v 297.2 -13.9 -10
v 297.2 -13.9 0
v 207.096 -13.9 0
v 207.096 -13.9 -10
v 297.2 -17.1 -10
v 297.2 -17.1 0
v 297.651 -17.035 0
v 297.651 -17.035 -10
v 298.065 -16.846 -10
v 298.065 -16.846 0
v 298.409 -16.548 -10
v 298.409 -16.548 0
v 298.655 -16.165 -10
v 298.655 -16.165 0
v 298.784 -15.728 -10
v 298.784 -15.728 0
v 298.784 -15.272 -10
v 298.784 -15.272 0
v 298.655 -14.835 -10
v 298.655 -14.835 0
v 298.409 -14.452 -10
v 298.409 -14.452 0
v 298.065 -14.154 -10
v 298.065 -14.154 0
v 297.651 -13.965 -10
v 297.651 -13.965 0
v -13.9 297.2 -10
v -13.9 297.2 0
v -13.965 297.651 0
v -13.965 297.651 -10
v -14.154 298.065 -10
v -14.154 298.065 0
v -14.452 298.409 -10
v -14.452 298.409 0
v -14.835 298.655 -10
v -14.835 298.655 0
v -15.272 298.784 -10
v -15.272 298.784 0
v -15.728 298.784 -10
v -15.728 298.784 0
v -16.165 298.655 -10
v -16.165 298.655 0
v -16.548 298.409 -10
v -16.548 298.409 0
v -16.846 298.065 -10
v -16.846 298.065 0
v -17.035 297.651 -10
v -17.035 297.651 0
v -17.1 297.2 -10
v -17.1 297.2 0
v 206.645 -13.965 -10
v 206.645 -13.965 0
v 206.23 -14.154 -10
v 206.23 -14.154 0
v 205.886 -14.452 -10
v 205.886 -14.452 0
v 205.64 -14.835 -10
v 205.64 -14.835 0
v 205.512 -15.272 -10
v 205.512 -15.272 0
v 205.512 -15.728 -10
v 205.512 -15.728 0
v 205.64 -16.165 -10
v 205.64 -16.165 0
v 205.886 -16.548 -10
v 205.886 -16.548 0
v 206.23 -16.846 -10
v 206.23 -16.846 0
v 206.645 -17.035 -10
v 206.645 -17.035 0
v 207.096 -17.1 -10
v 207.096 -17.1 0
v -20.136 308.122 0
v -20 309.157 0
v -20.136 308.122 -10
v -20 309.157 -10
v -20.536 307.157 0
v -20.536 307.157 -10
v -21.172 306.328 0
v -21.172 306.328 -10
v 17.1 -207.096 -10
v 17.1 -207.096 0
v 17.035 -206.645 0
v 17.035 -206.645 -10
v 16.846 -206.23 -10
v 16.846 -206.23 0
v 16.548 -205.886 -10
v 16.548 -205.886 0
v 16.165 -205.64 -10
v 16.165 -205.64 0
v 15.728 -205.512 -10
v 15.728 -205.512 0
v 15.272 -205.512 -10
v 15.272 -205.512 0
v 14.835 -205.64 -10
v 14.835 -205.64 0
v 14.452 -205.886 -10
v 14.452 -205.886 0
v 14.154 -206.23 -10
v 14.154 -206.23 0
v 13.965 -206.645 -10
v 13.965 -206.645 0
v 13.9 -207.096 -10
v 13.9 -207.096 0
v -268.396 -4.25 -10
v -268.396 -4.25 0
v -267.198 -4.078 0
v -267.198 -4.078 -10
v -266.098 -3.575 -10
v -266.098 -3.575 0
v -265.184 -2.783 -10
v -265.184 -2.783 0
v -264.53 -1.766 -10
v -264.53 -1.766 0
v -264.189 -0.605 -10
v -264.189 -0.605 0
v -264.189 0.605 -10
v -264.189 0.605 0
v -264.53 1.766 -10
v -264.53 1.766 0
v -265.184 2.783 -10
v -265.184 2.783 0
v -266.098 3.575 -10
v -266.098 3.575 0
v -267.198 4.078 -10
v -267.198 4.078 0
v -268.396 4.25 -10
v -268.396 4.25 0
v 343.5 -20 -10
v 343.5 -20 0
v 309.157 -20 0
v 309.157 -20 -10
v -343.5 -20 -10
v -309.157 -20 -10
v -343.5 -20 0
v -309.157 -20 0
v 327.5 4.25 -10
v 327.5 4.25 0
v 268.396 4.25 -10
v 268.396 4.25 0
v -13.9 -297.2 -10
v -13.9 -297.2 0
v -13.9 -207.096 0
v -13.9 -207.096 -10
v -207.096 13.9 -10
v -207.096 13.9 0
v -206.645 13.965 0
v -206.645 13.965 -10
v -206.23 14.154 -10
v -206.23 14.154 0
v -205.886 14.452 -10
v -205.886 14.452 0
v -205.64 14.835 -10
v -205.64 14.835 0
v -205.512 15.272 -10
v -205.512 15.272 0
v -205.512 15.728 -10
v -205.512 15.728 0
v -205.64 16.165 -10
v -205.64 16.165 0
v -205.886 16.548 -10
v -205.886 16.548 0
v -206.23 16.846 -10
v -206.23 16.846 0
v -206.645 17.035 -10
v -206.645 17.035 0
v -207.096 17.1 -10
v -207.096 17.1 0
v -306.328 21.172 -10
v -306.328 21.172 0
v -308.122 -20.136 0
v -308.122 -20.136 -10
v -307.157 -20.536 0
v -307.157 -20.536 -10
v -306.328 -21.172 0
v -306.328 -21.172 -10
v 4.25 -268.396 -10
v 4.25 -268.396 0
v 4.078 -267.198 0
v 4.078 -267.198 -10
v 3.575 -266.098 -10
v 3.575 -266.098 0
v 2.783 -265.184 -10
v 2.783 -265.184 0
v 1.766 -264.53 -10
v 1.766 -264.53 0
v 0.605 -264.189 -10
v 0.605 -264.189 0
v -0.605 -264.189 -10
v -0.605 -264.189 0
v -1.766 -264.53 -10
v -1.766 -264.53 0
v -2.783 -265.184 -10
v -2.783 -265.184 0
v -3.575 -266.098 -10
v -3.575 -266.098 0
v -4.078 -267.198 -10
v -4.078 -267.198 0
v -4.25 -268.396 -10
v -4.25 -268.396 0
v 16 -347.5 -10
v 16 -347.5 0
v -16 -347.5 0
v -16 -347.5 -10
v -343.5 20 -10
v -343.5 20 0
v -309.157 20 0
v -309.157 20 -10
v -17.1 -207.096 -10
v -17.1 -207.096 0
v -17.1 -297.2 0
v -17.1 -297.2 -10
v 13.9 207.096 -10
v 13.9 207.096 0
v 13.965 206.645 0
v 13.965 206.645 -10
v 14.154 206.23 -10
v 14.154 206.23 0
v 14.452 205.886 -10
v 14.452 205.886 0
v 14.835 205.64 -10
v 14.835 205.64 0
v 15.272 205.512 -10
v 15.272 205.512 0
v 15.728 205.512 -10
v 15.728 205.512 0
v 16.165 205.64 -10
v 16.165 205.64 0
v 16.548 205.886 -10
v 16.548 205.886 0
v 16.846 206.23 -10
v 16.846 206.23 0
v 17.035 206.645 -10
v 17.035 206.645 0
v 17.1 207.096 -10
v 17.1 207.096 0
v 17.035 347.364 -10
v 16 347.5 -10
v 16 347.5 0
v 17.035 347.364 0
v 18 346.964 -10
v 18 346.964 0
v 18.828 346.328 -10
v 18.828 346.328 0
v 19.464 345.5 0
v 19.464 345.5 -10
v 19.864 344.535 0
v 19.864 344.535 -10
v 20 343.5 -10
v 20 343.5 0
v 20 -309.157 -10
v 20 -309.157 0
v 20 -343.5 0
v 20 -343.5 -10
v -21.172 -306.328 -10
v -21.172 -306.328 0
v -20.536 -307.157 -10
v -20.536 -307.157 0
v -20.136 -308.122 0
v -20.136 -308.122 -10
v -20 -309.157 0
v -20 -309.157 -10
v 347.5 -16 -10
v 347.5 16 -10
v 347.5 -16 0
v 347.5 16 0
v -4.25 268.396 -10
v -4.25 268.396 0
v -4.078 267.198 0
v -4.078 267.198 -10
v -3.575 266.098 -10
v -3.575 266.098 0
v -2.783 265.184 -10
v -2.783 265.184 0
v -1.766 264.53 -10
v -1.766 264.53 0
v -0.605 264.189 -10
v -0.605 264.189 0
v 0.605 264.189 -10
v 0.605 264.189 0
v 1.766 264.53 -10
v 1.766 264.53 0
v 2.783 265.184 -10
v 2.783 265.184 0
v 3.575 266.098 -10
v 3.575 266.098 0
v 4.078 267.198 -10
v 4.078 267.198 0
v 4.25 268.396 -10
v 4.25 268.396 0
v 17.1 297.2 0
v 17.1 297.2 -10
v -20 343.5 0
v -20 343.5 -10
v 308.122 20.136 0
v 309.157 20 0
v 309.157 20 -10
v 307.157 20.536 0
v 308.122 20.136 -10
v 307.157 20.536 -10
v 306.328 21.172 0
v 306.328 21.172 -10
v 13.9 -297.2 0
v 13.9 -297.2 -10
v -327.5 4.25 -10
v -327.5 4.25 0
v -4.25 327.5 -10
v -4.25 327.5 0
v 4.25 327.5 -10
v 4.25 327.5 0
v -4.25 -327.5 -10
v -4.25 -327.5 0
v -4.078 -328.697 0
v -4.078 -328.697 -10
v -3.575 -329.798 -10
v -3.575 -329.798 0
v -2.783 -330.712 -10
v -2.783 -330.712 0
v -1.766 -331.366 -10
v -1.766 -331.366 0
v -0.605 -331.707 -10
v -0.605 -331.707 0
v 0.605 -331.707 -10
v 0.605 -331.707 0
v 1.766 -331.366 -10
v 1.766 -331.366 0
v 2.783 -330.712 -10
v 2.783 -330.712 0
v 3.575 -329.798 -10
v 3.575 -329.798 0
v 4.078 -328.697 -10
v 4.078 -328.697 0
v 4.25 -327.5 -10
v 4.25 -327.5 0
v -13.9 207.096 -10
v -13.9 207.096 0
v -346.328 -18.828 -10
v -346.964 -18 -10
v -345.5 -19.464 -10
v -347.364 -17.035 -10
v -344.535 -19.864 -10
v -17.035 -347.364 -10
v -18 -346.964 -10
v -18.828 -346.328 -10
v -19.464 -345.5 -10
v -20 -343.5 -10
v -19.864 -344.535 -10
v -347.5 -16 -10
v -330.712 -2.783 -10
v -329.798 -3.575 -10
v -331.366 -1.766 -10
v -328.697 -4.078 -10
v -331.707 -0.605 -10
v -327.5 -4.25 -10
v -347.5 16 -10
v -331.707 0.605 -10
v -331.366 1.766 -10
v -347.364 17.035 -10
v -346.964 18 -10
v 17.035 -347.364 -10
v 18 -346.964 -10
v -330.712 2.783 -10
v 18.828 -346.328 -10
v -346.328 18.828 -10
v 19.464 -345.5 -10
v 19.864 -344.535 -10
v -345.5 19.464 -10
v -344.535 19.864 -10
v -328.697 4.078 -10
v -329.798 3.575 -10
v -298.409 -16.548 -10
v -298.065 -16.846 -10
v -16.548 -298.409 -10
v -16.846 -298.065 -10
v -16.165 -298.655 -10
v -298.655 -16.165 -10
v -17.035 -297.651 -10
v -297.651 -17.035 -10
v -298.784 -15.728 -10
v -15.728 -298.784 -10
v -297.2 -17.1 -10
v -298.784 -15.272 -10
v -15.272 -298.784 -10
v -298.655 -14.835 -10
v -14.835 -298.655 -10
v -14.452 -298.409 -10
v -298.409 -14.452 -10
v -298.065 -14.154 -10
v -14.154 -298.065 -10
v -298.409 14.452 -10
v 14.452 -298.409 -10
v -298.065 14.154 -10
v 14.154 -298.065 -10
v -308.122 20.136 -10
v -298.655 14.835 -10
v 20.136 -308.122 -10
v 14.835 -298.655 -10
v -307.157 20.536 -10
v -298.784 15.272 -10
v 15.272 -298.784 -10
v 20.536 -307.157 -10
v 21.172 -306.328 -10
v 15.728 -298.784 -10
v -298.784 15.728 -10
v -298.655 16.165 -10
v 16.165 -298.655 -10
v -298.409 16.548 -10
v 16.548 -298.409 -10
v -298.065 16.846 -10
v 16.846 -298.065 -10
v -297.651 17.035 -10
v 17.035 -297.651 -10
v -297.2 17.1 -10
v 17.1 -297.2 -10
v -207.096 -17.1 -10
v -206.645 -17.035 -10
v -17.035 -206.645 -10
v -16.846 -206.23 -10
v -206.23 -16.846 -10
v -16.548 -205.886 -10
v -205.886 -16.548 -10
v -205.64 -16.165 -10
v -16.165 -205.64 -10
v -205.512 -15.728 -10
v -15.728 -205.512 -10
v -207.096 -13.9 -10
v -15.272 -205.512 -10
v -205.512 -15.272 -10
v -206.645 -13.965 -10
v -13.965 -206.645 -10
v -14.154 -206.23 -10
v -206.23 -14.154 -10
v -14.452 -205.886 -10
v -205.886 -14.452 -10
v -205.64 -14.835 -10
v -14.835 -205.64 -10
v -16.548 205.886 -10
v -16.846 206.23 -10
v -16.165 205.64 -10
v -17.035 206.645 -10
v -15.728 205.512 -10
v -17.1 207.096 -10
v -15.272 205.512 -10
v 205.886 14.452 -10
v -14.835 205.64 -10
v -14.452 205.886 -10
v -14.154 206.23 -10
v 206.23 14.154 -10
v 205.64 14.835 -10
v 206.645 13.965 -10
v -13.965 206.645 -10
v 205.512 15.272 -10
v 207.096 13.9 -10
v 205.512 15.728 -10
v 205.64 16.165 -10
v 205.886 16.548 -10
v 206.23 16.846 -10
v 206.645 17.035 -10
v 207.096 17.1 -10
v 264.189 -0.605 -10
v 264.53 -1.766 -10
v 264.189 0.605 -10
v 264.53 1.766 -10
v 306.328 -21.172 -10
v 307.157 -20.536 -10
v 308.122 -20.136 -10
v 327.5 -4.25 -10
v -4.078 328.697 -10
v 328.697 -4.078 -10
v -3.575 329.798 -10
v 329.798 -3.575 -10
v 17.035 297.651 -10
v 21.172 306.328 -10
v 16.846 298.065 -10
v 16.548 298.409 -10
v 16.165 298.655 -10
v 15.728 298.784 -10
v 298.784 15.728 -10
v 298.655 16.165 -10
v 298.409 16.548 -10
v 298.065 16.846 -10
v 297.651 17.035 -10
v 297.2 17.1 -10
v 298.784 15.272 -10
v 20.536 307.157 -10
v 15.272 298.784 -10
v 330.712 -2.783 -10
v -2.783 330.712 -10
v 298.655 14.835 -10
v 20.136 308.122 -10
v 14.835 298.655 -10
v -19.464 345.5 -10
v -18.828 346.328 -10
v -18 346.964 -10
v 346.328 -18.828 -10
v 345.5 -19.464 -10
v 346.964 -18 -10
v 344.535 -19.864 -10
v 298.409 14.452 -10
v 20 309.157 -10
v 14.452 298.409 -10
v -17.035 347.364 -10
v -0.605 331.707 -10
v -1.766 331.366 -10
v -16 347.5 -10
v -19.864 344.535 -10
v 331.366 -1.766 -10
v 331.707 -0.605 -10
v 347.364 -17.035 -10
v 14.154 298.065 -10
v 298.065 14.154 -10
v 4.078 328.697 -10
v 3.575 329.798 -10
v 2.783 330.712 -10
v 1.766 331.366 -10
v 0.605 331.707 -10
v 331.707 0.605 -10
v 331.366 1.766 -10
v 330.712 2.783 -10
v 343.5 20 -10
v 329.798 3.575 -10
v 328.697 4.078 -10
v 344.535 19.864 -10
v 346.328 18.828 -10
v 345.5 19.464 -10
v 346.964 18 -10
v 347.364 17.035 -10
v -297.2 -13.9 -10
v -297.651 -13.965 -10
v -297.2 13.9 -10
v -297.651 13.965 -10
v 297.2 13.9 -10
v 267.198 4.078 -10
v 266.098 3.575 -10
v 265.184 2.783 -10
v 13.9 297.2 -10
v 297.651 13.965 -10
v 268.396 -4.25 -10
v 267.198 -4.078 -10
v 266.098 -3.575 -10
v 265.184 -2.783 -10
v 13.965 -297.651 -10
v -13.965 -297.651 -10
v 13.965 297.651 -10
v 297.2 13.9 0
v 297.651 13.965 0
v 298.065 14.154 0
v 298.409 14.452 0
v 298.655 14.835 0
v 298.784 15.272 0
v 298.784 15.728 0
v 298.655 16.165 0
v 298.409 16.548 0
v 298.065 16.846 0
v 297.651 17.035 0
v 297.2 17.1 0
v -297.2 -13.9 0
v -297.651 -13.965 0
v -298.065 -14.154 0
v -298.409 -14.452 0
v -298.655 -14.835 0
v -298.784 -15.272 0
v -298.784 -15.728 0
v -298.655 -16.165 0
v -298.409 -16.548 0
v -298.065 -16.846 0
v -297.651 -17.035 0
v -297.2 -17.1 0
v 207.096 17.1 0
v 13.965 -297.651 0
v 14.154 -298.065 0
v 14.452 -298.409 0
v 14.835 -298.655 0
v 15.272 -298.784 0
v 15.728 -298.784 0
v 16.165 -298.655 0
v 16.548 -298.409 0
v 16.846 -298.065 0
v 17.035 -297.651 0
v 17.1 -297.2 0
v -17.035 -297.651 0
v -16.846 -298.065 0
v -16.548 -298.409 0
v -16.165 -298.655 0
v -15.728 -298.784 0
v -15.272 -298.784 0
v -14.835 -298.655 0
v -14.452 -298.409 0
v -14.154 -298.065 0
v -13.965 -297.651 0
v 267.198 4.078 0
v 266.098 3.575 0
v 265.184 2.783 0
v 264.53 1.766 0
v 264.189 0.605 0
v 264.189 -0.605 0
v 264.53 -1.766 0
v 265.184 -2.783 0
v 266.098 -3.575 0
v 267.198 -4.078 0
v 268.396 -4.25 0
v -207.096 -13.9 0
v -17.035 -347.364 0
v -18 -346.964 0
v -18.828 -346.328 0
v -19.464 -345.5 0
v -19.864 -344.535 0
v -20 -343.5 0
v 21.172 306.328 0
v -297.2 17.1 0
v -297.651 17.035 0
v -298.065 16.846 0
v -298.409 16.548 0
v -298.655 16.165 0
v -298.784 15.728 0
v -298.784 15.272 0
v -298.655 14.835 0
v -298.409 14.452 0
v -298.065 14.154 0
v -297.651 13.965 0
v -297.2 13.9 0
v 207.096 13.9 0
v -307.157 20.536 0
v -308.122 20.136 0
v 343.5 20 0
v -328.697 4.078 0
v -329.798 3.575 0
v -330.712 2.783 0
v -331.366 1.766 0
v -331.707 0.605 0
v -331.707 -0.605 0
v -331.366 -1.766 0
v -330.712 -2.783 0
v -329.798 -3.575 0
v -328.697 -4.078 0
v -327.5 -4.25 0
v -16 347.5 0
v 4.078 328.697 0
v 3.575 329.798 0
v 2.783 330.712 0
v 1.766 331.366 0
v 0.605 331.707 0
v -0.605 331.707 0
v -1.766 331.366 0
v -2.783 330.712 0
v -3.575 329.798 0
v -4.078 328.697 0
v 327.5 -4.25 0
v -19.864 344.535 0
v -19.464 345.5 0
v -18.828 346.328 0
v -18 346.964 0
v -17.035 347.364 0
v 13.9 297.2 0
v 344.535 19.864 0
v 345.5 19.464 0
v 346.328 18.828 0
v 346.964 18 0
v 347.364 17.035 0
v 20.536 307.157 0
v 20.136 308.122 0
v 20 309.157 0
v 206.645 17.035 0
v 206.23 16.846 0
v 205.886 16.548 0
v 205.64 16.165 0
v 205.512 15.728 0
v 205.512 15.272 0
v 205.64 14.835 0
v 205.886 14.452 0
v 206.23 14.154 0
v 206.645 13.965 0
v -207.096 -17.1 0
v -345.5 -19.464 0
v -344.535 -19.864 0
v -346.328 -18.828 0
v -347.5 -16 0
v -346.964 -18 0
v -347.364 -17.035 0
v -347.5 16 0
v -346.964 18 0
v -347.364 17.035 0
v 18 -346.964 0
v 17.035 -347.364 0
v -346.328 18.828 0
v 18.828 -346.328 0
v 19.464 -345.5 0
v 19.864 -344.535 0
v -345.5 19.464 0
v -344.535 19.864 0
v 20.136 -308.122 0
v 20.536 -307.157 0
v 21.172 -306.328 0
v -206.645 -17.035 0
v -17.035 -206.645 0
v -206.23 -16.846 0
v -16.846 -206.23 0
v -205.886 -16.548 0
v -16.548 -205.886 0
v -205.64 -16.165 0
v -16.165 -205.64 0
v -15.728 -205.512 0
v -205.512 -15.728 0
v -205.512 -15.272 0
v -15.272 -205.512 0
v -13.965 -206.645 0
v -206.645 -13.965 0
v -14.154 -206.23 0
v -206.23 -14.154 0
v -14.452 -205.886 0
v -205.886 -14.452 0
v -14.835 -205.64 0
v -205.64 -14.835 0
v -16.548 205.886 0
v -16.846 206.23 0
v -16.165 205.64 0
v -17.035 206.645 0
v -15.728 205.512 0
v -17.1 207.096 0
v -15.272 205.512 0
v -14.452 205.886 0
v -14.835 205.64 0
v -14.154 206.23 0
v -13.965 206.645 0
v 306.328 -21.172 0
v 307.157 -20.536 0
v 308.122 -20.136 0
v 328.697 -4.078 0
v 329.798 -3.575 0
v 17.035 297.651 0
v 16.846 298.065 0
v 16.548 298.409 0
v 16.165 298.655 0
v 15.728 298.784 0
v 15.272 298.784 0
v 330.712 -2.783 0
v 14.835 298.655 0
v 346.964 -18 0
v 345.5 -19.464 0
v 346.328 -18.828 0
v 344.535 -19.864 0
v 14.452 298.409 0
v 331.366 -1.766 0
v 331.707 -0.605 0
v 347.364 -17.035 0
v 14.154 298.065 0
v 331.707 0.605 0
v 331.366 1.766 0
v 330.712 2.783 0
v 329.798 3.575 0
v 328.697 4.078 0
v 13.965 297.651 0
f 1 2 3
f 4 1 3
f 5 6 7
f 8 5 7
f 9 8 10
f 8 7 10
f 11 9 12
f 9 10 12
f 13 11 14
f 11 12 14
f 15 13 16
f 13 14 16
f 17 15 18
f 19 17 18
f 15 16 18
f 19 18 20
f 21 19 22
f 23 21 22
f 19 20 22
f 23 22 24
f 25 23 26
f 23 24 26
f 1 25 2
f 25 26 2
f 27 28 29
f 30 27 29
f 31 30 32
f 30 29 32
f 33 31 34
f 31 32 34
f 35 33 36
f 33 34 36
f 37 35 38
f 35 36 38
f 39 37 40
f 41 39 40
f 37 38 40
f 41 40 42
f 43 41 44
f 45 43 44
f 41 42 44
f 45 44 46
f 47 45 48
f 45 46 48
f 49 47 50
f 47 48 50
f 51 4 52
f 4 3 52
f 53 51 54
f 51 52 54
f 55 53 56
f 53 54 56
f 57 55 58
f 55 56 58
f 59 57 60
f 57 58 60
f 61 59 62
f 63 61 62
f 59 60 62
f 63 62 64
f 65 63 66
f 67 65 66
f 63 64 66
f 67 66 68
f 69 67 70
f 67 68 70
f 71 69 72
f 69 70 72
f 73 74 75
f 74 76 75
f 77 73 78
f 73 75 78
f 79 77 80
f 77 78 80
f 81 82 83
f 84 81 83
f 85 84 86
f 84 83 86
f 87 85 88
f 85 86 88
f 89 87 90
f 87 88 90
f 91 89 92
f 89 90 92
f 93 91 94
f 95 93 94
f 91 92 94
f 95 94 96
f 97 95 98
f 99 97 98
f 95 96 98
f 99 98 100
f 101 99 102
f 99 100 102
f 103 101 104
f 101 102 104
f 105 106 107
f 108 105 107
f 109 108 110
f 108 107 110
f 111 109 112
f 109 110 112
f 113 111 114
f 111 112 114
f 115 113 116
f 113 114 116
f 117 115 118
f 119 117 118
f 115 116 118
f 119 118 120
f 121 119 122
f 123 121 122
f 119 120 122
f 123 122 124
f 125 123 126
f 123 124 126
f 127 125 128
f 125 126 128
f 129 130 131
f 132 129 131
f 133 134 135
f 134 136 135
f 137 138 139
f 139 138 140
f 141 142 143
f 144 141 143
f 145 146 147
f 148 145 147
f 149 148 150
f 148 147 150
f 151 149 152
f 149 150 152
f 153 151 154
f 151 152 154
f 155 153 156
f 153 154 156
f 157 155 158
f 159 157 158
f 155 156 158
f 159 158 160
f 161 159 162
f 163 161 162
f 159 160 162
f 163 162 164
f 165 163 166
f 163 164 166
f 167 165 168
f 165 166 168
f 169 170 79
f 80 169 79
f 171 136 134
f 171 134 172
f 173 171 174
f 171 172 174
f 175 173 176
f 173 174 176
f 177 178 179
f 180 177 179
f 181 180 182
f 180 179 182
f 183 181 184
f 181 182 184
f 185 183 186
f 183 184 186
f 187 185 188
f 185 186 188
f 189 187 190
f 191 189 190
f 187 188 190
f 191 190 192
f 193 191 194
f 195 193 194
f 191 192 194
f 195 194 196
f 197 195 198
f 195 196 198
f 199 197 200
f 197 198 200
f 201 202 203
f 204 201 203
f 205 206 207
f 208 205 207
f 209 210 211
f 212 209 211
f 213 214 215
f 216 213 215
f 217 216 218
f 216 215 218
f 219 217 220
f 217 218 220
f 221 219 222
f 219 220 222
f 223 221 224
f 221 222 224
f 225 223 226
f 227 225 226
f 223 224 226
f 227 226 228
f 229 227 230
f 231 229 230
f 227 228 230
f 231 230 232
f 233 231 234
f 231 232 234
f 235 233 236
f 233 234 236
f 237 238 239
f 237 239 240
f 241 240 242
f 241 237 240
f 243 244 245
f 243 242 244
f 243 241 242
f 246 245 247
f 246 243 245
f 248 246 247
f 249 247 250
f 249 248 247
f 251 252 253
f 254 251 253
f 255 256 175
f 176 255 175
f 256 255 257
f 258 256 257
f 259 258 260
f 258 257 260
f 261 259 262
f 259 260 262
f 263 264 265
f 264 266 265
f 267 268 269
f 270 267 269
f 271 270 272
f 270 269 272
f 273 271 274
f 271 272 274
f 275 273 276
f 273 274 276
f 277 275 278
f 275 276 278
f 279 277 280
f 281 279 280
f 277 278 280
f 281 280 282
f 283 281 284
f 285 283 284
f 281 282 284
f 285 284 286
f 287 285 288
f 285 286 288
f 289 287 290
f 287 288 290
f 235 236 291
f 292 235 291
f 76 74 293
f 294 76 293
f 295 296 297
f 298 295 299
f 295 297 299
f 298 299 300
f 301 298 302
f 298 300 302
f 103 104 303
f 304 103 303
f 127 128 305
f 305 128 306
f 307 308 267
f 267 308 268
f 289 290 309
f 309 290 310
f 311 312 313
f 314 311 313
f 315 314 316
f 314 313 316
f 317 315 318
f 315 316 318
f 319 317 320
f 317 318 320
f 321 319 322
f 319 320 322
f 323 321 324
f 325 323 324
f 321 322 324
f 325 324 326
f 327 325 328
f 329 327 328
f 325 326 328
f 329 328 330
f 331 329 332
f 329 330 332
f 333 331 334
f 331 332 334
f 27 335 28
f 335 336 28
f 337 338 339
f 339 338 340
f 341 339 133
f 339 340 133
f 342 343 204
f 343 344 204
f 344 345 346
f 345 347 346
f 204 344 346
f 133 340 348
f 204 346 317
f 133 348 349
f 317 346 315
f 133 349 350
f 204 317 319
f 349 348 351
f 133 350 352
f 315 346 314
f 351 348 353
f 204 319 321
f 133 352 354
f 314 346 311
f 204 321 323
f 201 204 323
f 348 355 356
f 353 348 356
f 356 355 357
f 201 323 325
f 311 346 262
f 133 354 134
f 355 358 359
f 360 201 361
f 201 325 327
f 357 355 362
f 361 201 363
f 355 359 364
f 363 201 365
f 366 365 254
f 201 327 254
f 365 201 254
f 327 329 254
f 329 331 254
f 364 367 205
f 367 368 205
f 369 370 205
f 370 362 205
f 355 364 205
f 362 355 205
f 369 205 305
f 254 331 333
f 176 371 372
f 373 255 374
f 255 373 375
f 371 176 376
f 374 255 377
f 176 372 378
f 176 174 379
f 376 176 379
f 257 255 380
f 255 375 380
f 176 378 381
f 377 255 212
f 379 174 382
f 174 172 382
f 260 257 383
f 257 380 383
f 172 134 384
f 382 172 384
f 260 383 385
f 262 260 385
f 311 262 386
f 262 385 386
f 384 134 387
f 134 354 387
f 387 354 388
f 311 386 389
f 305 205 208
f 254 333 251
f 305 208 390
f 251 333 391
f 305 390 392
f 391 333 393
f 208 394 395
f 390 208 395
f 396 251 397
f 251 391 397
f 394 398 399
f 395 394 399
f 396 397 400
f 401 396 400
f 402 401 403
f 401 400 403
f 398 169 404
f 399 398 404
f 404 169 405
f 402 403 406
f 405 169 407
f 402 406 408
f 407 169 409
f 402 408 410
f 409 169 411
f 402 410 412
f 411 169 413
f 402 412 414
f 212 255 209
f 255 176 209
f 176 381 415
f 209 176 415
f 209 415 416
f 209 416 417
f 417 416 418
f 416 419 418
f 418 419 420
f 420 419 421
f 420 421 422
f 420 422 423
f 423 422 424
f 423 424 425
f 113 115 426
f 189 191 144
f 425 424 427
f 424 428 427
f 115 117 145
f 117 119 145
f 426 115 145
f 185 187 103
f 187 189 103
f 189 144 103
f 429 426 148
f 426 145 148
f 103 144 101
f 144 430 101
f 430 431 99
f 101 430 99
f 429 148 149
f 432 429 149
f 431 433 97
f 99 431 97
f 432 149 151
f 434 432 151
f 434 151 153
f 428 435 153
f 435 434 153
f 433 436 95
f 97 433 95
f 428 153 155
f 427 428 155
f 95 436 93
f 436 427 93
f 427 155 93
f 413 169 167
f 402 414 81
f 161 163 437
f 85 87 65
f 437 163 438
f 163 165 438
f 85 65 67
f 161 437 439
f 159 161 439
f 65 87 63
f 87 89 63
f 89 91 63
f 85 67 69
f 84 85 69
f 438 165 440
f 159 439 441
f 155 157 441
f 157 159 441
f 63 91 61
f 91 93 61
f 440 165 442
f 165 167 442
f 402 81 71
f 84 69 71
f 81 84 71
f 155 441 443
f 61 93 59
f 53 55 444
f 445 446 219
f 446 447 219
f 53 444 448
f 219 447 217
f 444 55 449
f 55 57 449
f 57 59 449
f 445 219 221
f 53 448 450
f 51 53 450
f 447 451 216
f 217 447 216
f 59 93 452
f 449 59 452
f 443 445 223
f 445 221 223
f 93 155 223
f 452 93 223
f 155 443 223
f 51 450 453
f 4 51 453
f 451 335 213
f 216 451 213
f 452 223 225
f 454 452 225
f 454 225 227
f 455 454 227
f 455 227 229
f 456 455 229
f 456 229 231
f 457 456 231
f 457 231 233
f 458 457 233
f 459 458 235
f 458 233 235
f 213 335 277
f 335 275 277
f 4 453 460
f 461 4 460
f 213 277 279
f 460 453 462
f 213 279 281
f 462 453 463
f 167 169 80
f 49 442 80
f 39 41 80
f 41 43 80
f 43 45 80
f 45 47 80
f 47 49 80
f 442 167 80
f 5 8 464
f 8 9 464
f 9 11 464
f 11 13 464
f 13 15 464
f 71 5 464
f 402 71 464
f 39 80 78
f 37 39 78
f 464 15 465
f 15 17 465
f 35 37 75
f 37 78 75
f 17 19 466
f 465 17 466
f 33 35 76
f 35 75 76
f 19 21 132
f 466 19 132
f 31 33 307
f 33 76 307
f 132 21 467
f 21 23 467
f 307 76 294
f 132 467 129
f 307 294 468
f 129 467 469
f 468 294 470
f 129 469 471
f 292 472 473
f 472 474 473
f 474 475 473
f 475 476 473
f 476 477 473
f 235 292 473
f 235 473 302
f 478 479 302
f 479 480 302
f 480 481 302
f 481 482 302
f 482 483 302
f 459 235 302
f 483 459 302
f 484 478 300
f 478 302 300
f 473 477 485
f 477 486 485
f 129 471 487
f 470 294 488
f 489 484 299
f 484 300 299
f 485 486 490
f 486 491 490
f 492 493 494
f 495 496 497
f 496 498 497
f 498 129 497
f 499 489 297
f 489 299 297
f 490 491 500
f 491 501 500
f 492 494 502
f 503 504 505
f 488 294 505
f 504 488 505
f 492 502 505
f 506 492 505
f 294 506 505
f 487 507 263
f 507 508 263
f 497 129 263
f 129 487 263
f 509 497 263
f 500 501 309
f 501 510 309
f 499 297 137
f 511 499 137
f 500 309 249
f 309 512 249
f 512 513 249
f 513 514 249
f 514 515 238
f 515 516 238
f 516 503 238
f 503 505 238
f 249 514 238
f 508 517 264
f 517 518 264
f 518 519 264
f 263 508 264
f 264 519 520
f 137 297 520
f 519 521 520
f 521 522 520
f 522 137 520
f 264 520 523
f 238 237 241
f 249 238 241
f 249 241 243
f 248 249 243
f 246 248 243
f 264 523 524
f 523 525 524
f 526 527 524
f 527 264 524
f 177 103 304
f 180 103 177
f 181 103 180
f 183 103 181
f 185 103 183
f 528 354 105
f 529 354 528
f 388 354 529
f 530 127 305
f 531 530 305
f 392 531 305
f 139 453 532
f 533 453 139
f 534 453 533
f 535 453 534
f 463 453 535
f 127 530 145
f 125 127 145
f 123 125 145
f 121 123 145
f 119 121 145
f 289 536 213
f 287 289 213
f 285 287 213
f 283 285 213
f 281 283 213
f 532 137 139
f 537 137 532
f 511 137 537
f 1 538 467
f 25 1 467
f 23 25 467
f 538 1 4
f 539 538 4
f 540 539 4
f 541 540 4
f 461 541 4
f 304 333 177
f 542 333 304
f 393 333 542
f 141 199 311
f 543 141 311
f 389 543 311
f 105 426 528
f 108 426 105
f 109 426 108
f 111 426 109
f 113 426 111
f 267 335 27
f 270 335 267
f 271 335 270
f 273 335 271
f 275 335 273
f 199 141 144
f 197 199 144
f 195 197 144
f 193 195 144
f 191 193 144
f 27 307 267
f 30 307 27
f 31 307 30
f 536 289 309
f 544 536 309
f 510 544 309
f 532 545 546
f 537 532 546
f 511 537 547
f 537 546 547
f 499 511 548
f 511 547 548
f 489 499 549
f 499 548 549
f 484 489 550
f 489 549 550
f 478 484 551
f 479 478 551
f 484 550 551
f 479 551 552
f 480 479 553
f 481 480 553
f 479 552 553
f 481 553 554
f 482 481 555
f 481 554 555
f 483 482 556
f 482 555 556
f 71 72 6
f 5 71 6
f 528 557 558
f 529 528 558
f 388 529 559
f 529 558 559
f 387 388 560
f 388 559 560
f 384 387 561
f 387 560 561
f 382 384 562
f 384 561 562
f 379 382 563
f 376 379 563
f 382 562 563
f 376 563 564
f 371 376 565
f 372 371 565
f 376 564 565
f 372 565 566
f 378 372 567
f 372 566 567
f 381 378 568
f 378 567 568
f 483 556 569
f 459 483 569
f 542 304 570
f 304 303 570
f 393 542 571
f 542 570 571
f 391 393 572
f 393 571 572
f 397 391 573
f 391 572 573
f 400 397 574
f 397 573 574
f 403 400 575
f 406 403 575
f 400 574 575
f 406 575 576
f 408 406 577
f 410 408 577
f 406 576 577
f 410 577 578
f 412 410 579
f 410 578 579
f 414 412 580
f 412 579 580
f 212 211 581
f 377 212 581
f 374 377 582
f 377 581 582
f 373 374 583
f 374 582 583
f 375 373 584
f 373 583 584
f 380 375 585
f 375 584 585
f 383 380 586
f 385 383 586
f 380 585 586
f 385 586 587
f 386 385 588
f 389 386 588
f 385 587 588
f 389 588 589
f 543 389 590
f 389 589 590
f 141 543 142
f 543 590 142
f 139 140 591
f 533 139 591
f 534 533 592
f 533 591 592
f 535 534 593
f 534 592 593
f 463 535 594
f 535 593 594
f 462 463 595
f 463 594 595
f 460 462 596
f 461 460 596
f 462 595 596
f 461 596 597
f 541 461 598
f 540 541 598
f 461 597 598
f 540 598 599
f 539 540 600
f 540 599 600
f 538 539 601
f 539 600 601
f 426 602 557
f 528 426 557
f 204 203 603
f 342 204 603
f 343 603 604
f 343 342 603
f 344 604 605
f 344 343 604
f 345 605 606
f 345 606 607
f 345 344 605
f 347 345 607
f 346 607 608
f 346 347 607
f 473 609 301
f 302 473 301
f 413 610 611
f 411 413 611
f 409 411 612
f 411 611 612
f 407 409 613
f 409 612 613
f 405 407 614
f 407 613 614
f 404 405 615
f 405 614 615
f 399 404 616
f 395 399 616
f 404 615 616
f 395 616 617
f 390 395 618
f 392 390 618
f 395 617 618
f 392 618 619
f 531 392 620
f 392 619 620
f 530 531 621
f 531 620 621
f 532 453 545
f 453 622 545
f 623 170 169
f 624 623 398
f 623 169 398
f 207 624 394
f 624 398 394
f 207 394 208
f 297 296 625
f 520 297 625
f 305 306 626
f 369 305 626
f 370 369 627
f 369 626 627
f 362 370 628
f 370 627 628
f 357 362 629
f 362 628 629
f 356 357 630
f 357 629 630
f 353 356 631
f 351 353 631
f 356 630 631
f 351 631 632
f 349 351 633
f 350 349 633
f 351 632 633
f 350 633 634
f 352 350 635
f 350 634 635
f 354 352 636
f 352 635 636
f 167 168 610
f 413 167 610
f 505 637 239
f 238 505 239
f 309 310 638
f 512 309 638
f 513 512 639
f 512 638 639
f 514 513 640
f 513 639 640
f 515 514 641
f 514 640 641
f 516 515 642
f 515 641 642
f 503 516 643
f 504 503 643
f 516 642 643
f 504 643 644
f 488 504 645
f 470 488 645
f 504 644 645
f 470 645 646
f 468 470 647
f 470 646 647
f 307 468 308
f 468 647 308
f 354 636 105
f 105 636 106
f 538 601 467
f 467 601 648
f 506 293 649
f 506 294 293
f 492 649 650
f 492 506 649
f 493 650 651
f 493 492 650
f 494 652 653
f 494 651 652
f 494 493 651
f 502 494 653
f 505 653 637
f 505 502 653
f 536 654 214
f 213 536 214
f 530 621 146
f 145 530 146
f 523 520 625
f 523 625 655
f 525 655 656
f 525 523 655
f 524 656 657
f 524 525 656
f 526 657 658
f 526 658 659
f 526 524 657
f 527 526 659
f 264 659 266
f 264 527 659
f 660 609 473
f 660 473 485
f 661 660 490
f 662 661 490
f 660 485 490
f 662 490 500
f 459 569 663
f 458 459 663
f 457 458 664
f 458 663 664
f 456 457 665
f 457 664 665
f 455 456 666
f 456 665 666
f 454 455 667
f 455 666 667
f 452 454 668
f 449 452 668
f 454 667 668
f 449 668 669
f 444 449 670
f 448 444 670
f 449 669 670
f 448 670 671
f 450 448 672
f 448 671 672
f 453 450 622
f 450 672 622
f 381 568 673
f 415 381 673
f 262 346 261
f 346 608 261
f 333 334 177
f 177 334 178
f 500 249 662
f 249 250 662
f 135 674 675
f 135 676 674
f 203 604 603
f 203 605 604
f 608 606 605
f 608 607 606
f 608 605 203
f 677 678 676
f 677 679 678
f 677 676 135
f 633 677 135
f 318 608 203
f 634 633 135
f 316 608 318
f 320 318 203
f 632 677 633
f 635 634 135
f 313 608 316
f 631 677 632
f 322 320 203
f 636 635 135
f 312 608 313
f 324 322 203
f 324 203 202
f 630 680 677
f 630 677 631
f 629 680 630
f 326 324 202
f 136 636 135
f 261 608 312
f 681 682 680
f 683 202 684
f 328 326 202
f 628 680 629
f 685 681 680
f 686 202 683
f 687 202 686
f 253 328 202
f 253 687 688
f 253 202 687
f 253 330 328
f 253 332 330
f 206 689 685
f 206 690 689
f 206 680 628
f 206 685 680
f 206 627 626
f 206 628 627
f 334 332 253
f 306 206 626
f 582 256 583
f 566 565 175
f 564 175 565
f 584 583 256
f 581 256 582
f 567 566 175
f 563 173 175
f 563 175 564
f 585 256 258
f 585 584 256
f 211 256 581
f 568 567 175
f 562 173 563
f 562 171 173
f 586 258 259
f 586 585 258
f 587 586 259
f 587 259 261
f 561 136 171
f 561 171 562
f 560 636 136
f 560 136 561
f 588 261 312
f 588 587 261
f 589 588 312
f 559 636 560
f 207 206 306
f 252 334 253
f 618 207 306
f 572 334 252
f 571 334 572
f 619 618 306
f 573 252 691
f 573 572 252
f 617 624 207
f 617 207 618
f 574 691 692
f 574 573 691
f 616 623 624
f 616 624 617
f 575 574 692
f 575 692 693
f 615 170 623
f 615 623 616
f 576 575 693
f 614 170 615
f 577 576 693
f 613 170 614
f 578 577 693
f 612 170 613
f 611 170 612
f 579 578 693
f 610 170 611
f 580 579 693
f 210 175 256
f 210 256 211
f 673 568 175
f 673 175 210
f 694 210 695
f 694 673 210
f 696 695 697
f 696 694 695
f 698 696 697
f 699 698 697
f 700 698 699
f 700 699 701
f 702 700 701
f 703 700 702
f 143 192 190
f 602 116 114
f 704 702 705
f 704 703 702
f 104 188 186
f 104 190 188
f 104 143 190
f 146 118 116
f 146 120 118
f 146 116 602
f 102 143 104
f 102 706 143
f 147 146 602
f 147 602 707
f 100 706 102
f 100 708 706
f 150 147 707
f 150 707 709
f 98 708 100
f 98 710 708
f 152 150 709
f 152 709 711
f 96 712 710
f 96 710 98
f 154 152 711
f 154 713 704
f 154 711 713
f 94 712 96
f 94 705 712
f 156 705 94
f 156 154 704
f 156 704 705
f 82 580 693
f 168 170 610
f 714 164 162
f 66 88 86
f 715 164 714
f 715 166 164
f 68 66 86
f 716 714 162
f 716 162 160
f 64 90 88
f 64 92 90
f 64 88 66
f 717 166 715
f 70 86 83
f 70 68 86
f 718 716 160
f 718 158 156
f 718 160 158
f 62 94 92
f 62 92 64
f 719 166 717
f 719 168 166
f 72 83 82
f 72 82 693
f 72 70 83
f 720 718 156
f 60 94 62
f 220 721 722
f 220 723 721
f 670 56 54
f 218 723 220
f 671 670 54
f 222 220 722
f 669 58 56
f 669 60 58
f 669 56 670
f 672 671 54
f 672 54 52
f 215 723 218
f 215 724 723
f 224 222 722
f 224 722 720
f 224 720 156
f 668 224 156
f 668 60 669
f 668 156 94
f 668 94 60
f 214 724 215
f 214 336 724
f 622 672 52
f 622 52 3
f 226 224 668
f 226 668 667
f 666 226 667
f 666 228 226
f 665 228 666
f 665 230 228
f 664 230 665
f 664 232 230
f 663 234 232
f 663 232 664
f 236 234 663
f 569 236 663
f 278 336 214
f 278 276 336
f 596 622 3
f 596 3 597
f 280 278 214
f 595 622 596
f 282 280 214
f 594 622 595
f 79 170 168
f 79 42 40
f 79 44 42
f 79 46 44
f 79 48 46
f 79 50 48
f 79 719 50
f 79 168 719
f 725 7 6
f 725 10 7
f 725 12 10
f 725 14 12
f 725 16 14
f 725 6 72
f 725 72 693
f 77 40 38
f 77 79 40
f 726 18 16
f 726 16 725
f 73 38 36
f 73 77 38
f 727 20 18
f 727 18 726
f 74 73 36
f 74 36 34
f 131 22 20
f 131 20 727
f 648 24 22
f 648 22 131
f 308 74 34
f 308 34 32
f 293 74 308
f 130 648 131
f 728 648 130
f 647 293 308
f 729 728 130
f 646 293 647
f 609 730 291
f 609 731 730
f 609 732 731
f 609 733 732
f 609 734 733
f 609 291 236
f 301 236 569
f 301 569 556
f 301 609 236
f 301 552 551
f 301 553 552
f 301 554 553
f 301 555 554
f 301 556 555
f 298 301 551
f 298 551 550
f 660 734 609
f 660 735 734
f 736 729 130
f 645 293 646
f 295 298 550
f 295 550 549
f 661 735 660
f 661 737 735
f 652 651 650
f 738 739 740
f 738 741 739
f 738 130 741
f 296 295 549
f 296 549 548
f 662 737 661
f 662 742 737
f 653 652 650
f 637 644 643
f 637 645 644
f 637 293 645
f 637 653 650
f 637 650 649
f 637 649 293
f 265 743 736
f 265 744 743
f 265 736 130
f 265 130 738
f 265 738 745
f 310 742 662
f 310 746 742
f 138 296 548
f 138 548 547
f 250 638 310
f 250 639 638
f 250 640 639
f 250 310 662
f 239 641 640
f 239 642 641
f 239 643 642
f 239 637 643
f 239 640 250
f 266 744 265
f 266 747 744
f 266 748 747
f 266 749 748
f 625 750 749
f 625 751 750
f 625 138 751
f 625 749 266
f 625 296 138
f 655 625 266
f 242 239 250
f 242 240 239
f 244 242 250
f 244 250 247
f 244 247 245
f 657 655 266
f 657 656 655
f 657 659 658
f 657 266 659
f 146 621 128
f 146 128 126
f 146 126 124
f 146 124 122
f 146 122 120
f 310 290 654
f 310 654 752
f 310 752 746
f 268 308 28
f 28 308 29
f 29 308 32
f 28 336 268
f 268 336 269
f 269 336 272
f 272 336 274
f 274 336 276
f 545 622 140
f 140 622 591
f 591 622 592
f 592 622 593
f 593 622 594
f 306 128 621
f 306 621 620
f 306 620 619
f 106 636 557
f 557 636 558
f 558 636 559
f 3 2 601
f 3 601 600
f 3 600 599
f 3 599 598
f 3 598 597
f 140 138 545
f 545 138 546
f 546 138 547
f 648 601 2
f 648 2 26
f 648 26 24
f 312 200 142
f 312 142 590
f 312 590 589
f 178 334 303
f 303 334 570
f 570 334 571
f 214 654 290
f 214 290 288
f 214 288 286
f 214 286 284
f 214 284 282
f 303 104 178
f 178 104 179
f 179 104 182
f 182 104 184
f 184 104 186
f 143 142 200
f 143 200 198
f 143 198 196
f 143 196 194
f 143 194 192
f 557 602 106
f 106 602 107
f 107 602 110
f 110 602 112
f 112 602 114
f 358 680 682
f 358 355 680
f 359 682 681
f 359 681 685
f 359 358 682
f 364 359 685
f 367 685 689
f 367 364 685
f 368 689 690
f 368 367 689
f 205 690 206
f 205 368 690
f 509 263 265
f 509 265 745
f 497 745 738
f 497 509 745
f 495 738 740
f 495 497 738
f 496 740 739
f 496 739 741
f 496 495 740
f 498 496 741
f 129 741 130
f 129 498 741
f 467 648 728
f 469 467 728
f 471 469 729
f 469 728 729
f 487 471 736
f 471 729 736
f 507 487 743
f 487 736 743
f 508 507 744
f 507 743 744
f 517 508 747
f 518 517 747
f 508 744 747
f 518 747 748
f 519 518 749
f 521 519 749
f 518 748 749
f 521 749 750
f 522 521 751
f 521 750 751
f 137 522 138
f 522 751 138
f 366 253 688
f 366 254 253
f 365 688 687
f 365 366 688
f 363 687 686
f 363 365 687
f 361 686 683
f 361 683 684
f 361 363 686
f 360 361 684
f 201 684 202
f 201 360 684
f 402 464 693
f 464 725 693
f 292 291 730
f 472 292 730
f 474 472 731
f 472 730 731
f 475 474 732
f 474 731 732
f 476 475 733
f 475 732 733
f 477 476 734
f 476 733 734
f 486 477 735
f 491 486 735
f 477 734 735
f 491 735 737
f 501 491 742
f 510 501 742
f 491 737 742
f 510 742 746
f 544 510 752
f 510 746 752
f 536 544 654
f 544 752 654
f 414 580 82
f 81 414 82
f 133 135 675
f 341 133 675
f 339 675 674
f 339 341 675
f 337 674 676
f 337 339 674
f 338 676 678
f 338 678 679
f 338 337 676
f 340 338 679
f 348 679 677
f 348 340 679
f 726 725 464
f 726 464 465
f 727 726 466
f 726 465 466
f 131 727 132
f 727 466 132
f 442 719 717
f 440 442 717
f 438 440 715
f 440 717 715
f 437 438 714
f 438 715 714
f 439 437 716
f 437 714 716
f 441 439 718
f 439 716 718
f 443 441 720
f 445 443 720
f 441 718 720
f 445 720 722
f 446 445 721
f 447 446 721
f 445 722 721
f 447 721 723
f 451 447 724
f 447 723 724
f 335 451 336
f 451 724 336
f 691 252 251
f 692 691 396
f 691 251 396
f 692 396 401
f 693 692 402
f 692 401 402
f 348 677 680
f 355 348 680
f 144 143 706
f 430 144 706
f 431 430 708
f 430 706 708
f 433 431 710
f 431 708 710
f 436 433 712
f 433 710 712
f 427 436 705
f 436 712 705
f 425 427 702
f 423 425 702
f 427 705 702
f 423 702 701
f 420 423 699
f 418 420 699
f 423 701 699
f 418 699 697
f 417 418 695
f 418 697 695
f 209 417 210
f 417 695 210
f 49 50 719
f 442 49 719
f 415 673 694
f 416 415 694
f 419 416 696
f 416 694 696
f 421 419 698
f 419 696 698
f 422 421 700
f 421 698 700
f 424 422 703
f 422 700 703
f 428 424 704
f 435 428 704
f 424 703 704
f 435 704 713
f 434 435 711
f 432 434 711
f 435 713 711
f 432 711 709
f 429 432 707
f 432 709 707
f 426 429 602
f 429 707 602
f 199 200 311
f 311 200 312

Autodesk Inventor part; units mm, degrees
ref_plane "YZ Plane" through (0, 0, 0) normal (1, 0, 0) x (0, 1, 0)
ref_plane "XZ Plane" through (0, 0, 0) normal (0, 1, 0) x (-1, 0, 0)
ref_plane "XY Plane" through (0, 0, 0) normal (0, 0, 1) x (1, 0, 0)
sketch "Sketch2" plane through (0, 0, 0) normal (0, 0, 1) x (1, 0, 0)
  line L0 (307.5, 20) -> (347.5, 20)
  line L1 (347.5, 20) -> (347.5, -20)
  line L2 (347.5, -20) -> (307.5, -20)
  line L3 (307.5, -20) -> (307.5, 20)
  line L4 (307.5, 20) -> (347.5, -20) construction
  line L5 (347.5, 20) -> (307.5, -20) construction
  line L6 (327.5, 0) -> (-327.5, 0) construction
  line L7 (0, -327.5) -> (0, 327.5) construction
  line L8 (327.5, 0) -> (268.3955, 0) construction
  line L9 (327.5, 4.25) -> (268.3955, 4.25)
  line L10 (268.3955, -4.25) -> (327.5, -4.25)
  arc A0 (327.5, -4.25) -> (327.5, 4.25) centre (327.5, 0) ccw
  arc A1 (268.3955, 4.25) -> (268.3955, -4.25) centre (268.3955, 0) ccw
  line L11 (207.0955, 15.5) -> (297.2, 15.5) construction
  line L12 (207.0955, 13.9) -> (297.2, 13.9)
  line L13 (297.2, 17.1) -> (207.0955, 17.1)
  arc A2 (207.0955, 17.1) -> (207.0955, 13.9) centre (207.0955, 15.5) ccw
  arc A3 (297.2, 13.9) -> (297.2, 17.1) centre (297.2, 15.5) ccw
  line L14 (207.0955, -15.5) -> (297.2, -15.5) construction
  line L15 (207.0955, -17.1) -> (297.2, -17.1)
  line L16 (297.2, -13.9) -> (207.0955, -13.9)
  arc A4 (207.0955, -13.9) -> (207.0955, -17.1) centre (207.0955, -15.5) ccw
  arc A5 (297.2, -17.1) -> (297.2, -13.9) centre (297.2, -15.5) ccw
  arc A6 (-4.25, 268.3955) -> (4.25, 268.3955) centre (0, 268.3955) ccw
  line L17 (-13.9, 207.0955) -> (-13.9, 297.2)
  line L18 (-15.5, 207.0955) -> (-15.5, 297.2) construction
  line L19 (-17.1, 297.2) -> (-17.1, 207.0955)
  line L20 (17.1, 207.0955) -> (17.1, 297.2)
  line L21 (13.9, 297.2) -> (13.9, 207.0955)
  arc A7 (17.1, 297.2) -> (13.9, 297.2) centre (15.5, 297.2) ccw
  line L22 (20, 307.5) -> (-20, 307.5)
  line L23 (15.5, 207.0955) -> (15.5, 297.2) construction
  arc A8 (-17.1, 207.0955) -> (-13.9, 207.0955) centre (-15.5, 207.0955) ccw
  arc A9 (13.9, 207.0955) -> (17.1, 207.0955) centre (15.5, 207.0955) ccw
  line L24 (-20, 307.5) -> (-20, 347.5)
  line L25 (-20, 347.5) -> (20, 347.5)
  line L26 (20, 347.5) -> (20, 307.5)
  line L27 (-20, 307.5) -> (20, 347.5) construction
  line L28 (-20, 347.5) -> (20, 307.5) construction
  arc A10 (-13.9, 297.2) -> (-17.1, 297.2) centre (-15.5, 297.2) ccw
  line L29 (0, 327.5) -> (0, 268.3955) construction
  line L30 (4.25, 268.3955) -> (4.25, 327.5)
  arc A11 (4.25, 327.5) -> (-4.25, 327.5) centre (0, 327.5) ccw
  line L31 (-4.25, 327.5) -> (-4.25, 268.3955)
  arc A12 (-268.3955, -4.25) -> (-268.3955, 4.25) centre (-268.3955, 0) ccw
  line L32 (-207.0955, -13.9) -> (-297.2, -13.9)
  line L33 (-207.0955, -15.5) -> (-297.2, -15.5) construction
  line L34 (-297.2, -17.1) -> (-207.0955, -17.1)
  line L35 (-207.0955, 17.1) -> (-297.2, 17.1)
  line L36 (-297.2, 13.9) -> (-207.0955, 13.9)
  arc A13 (-297.2, 17.1) -> (-297.2, 13.9) centre (-297.2, 15.5) ccw
  line L37 (-307.5, 20) -> (-307.5, -20)
  line L38 (-207.0955, 15.5) -> (-297.2, 15.5) construction
  arc A14 (-207.0955, -17.1) -> (-207.0955, -13.9) centre (-207.0955, -15.5) ccw
  arc A15 (-207.0955, 13.9) -> (-207.0955, 17.1) centre (-207.0955, 15.5) ccw
  line L39 (-307.5, -20) -> (-347.5, -20)
  line L40 (-347.5, -20) -> (-347.5, 20)
  line L41 (-347.5, 20) -> (-307.5, 20)
  line L42 (-307.5, -20) -> (-347.5, 20) construction
  line L43 (-347.5, -20) -> (-307.5, 20) construction
  arc A16 (-297.2, -13.9) -> (-297.2, -17.1) centre (-297.2, -15.5) ccw
  line L44 (-327.5, 0) -> (-268.3955, 0) construction
  line L45 (-268.3955, 4.25) -> (-327.5, 4.25)
  arc A17 (-327.5, 4.25) -> (-327.5, -4.25) centre (-327.5, 0) ccw
  line L46 (-327.5, -4.25) -> (-268.3955, -4.25)
  arc A18 (4.25, -268.3955) -> (-4.25, -268.3955) centre (0, -268.3955) ccw
  line L47 (13.9, -207.0955) -> (13.9, -297.2)
  line L48 (15.5, -207.0955) -> (15.5, -297.2) construction
  line L49 (17.1, -297.2) -> (17.1, -207.0955)
  line L50 (-17.1, -207.0955) -> (-17.1, -297.2)
  line L51 (-13.9, -297.2) -> (-13.9, -207.0955)
  arc A19 (-17.1, -297.2) -> (-13.9, -297.2) centre (-15.5, -297.2) ccw
  line L52 (-20, -307.5) -> (20, -307.5)
  line L53 (-15.5, -207.0955) -> (-15.5, -297.2) construction
  arc A20 (17.1, -207.0955) -> (13.9, -207.0955) centre (15.5, -207.0955) ccw
  arc A21 (-13.9, -207.0955) -> (-17.1, -207.0955) centre (-15.5, -207.0955) ccw
  line L54 (20, -307.5) -> (20, -347.5)
  line L55 (20, -347.5) -> (-20, -347.5)
  line L56 (-20, -347.5) -> (-20, -307.5)
  line L57 (20, -307.5) -> (-20, -347.5) construction
  line L58 (20, -347.5) -> (-20, -307.5) construction
  arc A22 (13.9, -297.2) -> (17.1, -297.2) centre (15.5, -297.2) ccw
  line L59 (0, -327.5) -> (0, -268.3955) construction
  line L60 (-4.25, -268.3955) -> (-4.25, -327.5)
  arc A23 (-4.25, -327.5) -> (4.25, -327.5) centre (0, -327.5) ccw
  line L61 (4.25, -327.5) -> (4.25, -268.3955)
  line L62 (-307.5, 20) -> (-20, 307.5)
  line L63 (20, 307.5) -> (307.5, 20)
  line L64 (307.5, -20) -> (20, -307.5)
  line L65 (-20, -307.5) -> (-307.5, -20)
  point P0 (0, 0)
  point P1 (297.9478, 0)
  point P2 (252.1478, 15.5)
  point P3 (252.1478, -15.5)
  point P4 (15.5, 252.1478)
  point P5 (-15.5, 252.1478)
  point P6 (0, 297.9478)
  point P7 (-252.1478, 15.5)
  point P8 (-252.1478, -15.5)
  point P9 (-297.9478, 0)
  point P10 (-15.5, -252.1478)
  point P11 (15.5, -252.1478)
  point P12 (0, -297.9478)
  dimension "d148" = 40
  dimension "d149" = 655
  dimension "d154" = 59.1045
  dimension "d155" = 8.5
  dimension "d156" = 90.1045
  dimension "d157" = 3.2
  dimension "d171" = 31
  dimension "d172" = 10.3
  dimension "d173" = 10.3
  dimension "d176" = 360
extrude "Extrusion10" add sketch "Sketch2" against normal blind 10 contours L0 L1 L2 L3 L10 A0 L9 | L3 L9 A1 L10 L64 L52 L61 A18 L60 L65 L37 L46 A12 L45 L62 L22 L31 A6 L30 L63 | L22 L30 A11 L31 L24 L25 L26 | L54 L55 L56 L52 L60 A23 L61 | L37 L45 A17 L46 L39 L40 L41
fillet "Fillet8" radius 4 16 edges at (20, 347.5, -5) (-20, 347.5, -5) (-20, 307.5, -5) (-307.5, 20, -5) (-347.5, 20, -5) (-347.5, -20, -5) (347.5, 20, -5) (-20, -307.5, -5) (-20, -347.5, -5) (20, 307.5, -5) (20, -347.5, -5) (347.5, -20, -5) (307.5, -20, -5) (20, -307.5, -5) (307.5, 20, -5) (-307.5, -20, -5)
equation "\"ring_inner_diam\" = 565"
equation "\"ring_outer_diam\" = 615"
equation "\"dist_motor_bar\" = 10.3"
equation "\"motor_slot_diam\" = 3.2"
equation "\"motor_slot_length\" = 90.1045"
equation "\"bar_slot_diam\" = 8.5"
equation "\"bar_slot_length\" = 59.1045"
equation "\"diag_dist_bar_holes_old_fridge\" = 536.791"
equation "\"motor_dist_slots\" = 31"
properties part number "base_plate" material "Aluminum 6061"
